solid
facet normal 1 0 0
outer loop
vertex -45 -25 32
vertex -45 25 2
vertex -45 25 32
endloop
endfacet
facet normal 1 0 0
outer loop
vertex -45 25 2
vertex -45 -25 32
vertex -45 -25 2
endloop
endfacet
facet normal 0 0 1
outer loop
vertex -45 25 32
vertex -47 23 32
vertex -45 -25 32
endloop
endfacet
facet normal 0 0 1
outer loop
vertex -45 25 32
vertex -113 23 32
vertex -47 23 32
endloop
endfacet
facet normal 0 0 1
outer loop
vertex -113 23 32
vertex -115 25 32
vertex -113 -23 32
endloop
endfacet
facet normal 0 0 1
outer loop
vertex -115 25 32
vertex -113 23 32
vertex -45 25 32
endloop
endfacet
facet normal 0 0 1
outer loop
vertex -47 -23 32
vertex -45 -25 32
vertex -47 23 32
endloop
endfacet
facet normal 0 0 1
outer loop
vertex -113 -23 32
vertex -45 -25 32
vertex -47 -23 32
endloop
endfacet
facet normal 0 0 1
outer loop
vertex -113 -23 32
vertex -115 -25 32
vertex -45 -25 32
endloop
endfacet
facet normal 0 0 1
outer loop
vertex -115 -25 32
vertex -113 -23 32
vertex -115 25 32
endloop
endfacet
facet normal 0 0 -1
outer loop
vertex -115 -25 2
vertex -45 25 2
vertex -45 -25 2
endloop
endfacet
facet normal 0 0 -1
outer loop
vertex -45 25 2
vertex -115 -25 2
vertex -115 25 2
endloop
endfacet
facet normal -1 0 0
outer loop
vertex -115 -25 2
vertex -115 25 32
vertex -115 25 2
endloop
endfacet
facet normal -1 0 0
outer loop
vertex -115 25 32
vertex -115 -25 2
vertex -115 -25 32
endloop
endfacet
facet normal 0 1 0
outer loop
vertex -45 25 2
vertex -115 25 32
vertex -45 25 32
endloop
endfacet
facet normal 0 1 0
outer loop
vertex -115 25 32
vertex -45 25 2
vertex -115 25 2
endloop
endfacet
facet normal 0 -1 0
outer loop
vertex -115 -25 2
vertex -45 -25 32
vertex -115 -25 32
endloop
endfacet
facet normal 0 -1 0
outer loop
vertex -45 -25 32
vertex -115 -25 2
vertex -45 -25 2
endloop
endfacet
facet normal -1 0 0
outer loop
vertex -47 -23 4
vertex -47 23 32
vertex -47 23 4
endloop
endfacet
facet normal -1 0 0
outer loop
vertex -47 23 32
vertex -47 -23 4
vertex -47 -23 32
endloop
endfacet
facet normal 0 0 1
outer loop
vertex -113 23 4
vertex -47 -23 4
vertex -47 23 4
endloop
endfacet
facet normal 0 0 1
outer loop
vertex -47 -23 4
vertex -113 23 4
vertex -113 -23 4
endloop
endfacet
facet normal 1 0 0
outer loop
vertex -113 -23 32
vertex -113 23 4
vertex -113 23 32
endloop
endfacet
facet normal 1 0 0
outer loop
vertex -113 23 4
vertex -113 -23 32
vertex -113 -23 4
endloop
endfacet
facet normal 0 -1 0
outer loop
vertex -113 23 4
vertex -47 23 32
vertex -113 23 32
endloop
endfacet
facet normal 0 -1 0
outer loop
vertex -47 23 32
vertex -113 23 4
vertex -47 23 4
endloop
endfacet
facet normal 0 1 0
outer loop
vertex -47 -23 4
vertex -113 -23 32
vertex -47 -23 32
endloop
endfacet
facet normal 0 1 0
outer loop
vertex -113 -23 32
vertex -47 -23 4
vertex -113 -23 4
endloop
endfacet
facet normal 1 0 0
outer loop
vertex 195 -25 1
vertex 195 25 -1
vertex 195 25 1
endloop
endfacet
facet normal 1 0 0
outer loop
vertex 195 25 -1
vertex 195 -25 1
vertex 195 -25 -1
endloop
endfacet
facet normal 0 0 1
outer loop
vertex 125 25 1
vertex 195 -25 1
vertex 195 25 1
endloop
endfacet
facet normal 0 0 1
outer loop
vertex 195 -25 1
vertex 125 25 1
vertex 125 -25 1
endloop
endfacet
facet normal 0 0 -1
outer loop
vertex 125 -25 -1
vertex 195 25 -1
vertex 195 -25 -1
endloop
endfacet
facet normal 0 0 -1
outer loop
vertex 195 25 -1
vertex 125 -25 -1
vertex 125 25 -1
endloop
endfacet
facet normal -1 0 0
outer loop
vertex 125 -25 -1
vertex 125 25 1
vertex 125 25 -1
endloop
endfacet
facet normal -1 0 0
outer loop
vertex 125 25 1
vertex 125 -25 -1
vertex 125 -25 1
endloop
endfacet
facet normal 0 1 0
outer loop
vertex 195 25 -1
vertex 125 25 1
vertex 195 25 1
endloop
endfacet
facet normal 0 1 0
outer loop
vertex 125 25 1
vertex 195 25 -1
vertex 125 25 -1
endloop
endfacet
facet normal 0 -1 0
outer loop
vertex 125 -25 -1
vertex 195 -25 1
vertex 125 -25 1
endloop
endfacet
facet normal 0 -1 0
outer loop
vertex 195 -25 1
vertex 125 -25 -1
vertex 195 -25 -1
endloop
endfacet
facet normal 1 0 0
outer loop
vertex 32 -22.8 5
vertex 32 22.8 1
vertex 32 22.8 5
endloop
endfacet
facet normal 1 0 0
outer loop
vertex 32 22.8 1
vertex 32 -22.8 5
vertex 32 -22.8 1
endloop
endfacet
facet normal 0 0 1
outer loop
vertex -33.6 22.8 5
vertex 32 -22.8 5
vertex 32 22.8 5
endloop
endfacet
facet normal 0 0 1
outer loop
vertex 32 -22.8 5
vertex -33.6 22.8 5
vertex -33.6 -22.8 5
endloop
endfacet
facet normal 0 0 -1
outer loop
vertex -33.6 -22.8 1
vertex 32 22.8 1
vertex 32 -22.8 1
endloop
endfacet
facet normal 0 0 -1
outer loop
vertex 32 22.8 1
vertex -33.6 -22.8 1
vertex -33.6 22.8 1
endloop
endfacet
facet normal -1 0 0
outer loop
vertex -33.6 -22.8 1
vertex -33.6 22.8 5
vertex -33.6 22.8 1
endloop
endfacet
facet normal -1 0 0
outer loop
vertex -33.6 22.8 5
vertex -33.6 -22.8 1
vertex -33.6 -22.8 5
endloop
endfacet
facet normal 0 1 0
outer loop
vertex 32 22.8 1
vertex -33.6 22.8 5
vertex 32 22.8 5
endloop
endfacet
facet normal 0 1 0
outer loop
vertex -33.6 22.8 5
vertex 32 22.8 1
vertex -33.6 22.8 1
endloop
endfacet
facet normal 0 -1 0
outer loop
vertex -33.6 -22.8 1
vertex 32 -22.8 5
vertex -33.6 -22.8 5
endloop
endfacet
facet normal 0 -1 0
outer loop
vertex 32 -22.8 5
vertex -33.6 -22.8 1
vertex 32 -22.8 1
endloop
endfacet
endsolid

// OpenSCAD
// Built by bench/smallmodels/features/compiler.py from a list of features.
$fn = 64;
difference() {
  union() {
    translate([-80, 0, 2]) translate([-35, -25, 0]) cube([70, 50, 30]);
  }
  translate([-113, -23, 4]) cube([66, 46, 29]);  // shell, wall 2, open top
}
union() {
    translate([160, 0, -1]) translate([-35, -25, 0]) cube([70, 50, 2]);
    translate([-0.8, 0, 1]) translate([-32.8, -22.8, 0]) cube([65.6, 45.6, 4]);
  }
